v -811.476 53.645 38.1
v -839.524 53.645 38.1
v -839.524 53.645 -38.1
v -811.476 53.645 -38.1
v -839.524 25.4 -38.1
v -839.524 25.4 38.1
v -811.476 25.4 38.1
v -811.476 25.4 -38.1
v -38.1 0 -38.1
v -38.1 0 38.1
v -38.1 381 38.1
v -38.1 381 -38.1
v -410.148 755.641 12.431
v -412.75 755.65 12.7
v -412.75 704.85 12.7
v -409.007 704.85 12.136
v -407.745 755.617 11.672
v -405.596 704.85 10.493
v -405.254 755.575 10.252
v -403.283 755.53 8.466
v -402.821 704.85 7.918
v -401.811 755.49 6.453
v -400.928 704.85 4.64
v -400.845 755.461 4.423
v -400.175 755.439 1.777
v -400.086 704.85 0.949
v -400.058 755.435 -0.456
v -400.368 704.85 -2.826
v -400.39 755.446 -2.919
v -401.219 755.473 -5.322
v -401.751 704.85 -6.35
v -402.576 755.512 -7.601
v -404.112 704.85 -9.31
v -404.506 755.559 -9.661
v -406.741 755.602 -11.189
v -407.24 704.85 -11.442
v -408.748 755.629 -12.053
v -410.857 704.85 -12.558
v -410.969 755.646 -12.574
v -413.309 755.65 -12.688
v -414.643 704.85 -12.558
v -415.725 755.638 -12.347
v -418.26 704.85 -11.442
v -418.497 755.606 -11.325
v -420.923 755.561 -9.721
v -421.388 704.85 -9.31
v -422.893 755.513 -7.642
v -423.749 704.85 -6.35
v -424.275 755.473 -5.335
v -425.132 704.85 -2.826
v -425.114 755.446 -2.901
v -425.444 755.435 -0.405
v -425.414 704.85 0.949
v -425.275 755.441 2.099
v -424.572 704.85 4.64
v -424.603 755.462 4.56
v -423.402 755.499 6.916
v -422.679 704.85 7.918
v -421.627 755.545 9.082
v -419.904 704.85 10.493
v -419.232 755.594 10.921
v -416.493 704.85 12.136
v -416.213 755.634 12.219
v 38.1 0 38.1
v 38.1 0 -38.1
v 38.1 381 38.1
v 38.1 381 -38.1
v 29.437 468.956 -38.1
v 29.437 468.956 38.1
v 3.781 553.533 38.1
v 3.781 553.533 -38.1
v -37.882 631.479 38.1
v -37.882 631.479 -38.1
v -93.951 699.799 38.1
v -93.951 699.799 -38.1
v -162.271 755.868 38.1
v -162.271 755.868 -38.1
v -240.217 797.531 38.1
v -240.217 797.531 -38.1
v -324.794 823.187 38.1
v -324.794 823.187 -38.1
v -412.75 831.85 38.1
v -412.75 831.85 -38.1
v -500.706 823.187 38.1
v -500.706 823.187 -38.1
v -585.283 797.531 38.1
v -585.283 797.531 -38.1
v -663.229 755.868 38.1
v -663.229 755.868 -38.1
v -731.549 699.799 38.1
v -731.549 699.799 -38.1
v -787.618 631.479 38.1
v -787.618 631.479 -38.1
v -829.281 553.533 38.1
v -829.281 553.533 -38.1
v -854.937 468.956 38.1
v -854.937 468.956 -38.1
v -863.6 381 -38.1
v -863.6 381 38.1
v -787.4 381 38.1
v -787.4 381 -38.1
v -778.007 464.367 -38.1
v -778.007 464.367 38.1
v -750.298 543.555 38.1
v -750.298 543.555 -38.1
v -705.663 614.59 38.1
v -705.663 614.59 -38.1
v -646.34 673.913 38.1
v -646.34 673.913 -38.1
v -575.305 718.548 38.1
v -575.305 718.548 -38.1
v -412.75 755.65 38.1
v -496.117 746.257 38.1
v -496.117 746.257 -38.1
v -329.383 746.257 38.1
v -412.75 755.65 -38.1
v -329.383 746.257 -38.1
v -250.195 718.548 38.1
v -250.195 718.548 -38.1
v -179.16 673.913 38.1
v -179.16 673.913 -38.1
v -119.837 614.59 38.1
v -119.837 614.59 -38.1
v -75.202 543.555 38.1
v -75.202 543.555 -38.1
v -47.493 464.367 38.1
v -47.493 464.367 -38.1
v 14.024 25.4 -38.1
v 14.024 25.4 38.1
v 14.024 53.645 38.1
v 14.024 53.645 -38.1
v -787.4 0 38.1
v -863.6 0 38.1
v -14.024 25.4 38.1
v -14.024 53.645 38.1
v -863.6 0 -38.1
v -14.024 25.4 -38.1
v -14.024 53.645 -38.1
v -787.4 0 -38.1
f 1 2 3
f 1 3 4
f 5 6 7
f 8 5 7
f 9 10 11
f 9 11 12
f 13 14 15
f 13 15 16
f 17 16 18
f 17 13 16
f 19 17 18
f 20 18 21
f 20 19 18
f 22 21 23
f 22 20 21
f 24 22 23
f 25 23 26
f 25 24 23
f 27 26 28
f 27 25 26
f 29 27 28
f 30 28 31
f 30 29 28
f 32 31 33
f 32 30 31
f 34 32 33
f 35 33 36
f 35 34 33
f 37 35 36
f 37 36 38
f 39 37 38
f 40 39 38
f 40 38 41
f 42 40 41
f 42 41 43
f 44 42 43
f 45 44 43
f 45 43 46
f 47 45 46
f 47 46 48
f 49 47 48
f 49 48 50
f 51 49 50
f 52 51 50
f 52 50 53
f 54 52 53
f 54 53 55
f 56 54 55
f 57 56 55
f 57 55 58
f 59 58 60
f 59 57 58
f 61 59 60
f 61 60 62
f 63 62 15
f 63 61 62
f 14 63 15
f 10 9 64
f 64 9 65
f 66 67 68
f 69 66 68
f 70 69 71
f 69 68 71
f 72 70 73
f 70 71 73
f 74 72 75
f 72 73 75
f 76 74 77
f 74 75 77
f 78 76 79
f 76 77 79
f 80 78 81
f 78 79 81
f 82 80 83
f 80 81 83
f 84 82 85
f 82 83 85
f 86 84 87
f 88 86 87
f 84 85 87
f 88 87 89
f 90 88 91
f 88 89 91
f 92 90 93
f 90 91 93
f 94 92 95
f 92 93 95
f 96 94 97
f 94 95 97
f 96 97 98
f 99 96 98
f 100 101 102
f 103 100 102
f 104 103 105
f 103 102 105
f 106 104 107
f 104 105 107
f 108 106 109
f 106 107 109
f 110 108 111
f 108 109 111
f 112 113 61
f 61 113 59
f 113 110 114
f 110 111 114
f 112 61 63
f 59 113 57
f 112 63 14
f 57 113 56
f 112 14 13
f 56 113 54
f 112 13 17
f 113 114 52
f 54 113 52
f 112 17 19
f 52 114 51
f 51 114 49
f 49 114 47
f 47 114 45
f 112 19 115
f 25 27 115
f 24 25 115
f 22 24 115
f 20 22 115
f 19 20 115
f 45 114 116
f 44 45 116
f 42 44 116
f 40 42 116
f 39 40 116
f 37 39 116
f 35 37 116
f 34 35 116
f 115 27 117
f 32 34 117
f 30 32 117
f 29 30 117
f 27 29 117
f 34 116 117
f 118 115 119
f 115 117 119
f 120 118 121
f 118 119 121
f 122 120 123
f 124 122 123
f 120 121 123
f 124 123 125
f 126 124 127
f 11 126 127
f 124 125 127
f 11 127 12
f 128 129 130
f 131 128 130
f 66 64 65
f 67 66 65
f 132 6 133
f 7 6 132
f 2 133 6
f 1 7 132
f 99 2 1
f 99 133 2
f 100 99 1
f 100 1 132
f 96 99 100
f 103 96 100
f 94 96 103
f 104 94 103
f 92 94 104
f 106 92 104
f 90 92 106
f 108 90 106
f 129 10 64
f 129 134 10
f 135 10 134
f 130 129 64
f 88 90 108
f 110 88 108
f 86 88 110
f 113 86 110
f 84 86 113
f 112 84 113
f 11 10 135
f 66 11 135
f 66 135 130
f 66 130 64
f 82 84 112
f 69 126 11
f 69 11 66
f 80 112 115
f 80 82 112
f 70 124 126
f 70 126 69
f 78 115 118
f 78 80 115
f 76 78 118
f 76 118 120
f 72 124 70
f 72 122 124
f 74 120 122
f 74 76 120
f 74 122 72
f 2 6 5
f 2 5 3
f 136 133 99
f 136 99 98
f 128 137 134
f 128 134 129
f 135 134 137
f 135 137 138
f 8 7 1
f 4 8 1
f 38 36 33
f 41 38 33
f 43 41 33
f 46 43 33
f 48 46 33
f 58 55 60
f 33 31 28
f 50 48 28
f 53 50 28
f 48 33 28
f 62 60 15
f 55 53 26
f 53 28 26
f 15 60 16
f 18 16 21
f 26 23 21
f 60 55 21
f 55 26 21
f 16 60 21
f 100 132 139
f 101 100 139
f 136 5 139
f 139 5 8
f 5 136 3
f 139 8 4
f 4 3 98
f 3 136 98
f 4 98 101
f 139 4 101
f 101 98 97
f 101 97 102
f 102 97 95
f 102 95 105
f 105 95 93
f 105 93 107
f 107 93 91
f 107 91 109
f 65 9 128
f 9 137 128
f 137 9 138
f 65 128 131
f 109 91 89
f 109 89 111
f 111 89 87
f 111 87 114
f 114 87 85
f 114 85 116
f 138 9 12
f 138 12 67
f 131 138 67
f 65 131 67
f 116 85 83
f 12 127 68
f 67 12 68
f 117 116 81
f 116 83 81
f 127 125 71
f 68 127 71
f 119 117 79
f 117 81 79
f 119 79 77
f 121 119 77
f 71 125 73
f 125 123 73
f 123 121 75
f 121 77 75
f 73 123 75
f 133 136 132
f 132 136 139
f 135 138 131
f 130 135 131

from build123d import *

# Parameters (mm, degrees)
SKETCH1_W                = 76.2
SKETCH1_H                = 76.2
BOSS_EXTRUDE1_DEPTH      = 381
BOSS_EXTRUDE1_2_DEPTH    = 381
CUT_EXTRUDE1_DEPTH       = 945.678553795
CUT_EXTRUDE1_DEPTH_BACK  = 945.678553795
SKETCH3_W                = 28.047256614
SKETCH3_H                = 28.245033948
BOSS_EXTRUDE2_DEPTH      = 38.1
BOSS_EXTRUDE2_DEPTH_BACK = 38.1
SKETCH5_R                = 12.7
BOSS_EXTRUDE3_DEPTH      = 50.8


with BuildPart() as part:
    # Sketch1 → Boss-Extrude1 (new body)
    with BuildSketch(Plane(origin=(0, 0, 0), x_dir=(1, 0, 0), z_dir=(0, 1, 0))):
        Rectangle(SKETCH1_W, SKETCH1_H)
    extrude(amount=BOSS_EXTRUDE1_DEPTH)


with BuildPart() as body_2:
    # Sketch1 → Boss-Extrude1 2 (new body)
    with BuildSketch(Plane(origin=(0, 0, 0), x_dir=(1, 0, 0), z_dir=(0, 1, 0))):
        with Locations((-825.5, 0)):
            Rectangle(SKETCH1_W, SKETCH1_H)
    extrude(amount=BOSS_EXTRUDE1_2_DEPTH)


with BuildPart() as cut_extrude1_tool:
    # Sketch3 → Cut-Extrude1 (new, two sides: drawn at the far end of the back side and taken through both)
    with BuildSketch(Plane.XY.offset(-CUT_EXTRUDE1_DEPTH_BACK)):
        with Locations((-825.5, 39.522516974)):
            Rectangle(SKETCH3_W, SKETCH3_H)
        with Locations((0, 39.522516974)):
            Rectangle(SKETCH3_W, SKETCH3_H)
    extrude(amount=CUT_EXTRUDE1_DEPTH + CUT_EXTRUDE1_DEPTH_BACK)


with BuildPart() as part_1:
    add(part.part)

    # Cut-Extrude1: cut by cut_extrude1_tool
    add(cut_extrude1_tool.part, mode=Mode.SUBTRACT)



with BuildPart() as body_2_1:
    add(body_2.part)

    # Cut-Extrude1: cut by cut_extrude1_tool
    add(cut_extrude1_tool.part, mode=Mode.SUBTRACT)


with BuildPart() as part_2:
    add(part_1.part)

    add(body_2_1.part)  # Boss-Extrude2 merges body 2
    # Sketch4 → Boss-Extrude2 (add, two sides: drawn at the far end of the back side and taken through both)
    with BuildSketch(Plane.XY.offset(-BOSS_EXTRUDE2_DEPTH_BACK)):
        with BuildLine():
            Line((-863.6, 381), (-787.4, 381))
            ThreePointArc((-787.4, 381), (-412.75, 755.65), (-38.1, 381))
            Line((-38.1, 381), (38.1, 381))
            ThreePointArc((38.1, 381), (-412.75, 831.85), (-863.6, 381))
        make_face()
    extrude(amount=BOSS_EXTRUDE2_DEPTH + BOSS_EXTRUDE2_DEPTH_BACK)

    # Sketch5 → Boss-Extrude3 (add)
    with BuildSketch(Plane(origin=(0, 755.65, 0), x_dir=(1, 0, 0), z_dir=(0, 1, 0))):
        with Locations(Location((-412.75, 0, 0), (0, 0, 270))):
            Circle(SKETCH5_R)
    extrude(amount=-BOSS_EXTRUDE3_DEPTH)


solid = part_2.part
